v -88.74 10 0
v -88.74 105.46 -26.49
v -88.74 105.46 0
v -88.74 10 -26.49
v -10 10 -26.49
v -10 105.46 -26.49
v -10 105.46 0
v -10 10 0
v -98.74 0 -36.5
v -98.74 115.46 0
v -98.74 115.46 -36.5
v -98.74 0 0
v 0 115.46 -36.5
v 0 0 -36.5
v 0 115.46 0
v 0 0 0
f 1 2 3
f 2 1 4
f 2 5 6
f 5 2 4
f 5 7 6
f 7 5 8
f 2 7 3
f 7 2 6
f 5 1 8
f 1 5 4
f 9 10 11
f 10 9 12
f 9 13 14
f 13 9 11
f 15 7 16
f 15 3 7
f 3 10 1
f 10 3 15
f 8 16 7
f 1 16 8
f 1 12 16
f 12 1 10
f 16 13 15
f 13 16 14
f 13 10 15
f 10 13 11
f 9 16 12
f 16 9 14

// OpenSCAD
// Exposed parameters
length = 68.6;    // [length] = 68.6;    // Length of Arduino Uno in mm
width = 53.4;     // [width] = 53.4;     // Width of Arduino Uno in mm
height = 15.0;    // [height] = 15.0;    // Approximate height of Arduino Uno in mm
tolerance = 0.1;  // [tolerance] = 0.1;  // Tolerance percentage
generate = false; // [generate] = false;  // Part 1 or Part 2 
plaster_wall_width = 10;

// Calculate the adjusted dimensions with tolerance
adj_length = length * (1 + tolerance);
adj_width = width * (1 + tolerance);
adj_height = height * (1 + tolerance);

// Create the box with adjusted dimensions
module parametric_box(h, w, l) {
    translate([plaster_wall_width, plaster_wall_width, -0.01])
        cube([w, l, h]);
}

// Create the red box with adjusted dimensions
module mold_box(h, w, l, scale, colorName) {
    color(colorName)
            cube([w + scale, l+ scale, h+ scale/2]);
}

module plaster_box(){
    // INVERSE MOLD
              
}
module inversebox1(){
    difference(){
        difference(){
            mold_box(adj_height + 1 * (plaster_wall_width), adj_width + 2 * (plaster_wall_width), adj_length + 2 * (plaster_wall_width), 2 * (plaster_wall_width), "blue");

            translate([plaster_wall_width, plaster_wall_width, -0.01])
                difference() {
                    mold_box(adj_height, adj_width, adj_length, 2 * (plaster_wall_width), "red");
                    parametric_box(adj_height, adj_width, adj_length);
                };
        }
        
        // REMOVING PART 2 of the INVERSE MOLD
        translate([plaster_wall_width -1, plaster_wall_width-1, -1.01])
            parametric_box(adj_height + 2, adj_width + 2, adj_length +2);  
    }
}
module inversebox2(){
    intersection(){
        difference(){
            mold_box(adj_height + 1 * (plaster_wall_width), adj_width + 2 * (plaster_wall_width), adj_length + 2 * (plaster_wall_width), 2 * (plaster_wall_width), "blue");

            translate([plaster_wall_width, plaster_wall_width, -0.01])
                difference() {
                    mold_box(adj_height, adj_width, adj_length, 2 * (plaster_wall_width), "red");
                    parametric_box(adj_height, adj_width, adj_length);
                };
        }
        
        // REMOVING PART 2 of the INVERSE MOLD
        translate([plaster_wall_width -1, plaster_wall_width-1, -1.01])
            parametric_box(adj_height + 2, adj_width + 2, adj_length +2);  
    }
}
module top_mold_lid(w, l){
    translate([0, 0, -plaster_wall_width])
        color("green")
            cube([w + plaster_wall_width *  4, l + plaster_wall_width *  4, plaster_wall_width]);
}
 module part2(){
    translate([0, 0, -50])
        union(){
            inversebox2();
            top_mold_lid(adj_width, adj_length);
        }
    }
//inversebox1();
if(generate){
    part2();
}else{
   rotate([0,180, 0])
    inversebox1();
}
